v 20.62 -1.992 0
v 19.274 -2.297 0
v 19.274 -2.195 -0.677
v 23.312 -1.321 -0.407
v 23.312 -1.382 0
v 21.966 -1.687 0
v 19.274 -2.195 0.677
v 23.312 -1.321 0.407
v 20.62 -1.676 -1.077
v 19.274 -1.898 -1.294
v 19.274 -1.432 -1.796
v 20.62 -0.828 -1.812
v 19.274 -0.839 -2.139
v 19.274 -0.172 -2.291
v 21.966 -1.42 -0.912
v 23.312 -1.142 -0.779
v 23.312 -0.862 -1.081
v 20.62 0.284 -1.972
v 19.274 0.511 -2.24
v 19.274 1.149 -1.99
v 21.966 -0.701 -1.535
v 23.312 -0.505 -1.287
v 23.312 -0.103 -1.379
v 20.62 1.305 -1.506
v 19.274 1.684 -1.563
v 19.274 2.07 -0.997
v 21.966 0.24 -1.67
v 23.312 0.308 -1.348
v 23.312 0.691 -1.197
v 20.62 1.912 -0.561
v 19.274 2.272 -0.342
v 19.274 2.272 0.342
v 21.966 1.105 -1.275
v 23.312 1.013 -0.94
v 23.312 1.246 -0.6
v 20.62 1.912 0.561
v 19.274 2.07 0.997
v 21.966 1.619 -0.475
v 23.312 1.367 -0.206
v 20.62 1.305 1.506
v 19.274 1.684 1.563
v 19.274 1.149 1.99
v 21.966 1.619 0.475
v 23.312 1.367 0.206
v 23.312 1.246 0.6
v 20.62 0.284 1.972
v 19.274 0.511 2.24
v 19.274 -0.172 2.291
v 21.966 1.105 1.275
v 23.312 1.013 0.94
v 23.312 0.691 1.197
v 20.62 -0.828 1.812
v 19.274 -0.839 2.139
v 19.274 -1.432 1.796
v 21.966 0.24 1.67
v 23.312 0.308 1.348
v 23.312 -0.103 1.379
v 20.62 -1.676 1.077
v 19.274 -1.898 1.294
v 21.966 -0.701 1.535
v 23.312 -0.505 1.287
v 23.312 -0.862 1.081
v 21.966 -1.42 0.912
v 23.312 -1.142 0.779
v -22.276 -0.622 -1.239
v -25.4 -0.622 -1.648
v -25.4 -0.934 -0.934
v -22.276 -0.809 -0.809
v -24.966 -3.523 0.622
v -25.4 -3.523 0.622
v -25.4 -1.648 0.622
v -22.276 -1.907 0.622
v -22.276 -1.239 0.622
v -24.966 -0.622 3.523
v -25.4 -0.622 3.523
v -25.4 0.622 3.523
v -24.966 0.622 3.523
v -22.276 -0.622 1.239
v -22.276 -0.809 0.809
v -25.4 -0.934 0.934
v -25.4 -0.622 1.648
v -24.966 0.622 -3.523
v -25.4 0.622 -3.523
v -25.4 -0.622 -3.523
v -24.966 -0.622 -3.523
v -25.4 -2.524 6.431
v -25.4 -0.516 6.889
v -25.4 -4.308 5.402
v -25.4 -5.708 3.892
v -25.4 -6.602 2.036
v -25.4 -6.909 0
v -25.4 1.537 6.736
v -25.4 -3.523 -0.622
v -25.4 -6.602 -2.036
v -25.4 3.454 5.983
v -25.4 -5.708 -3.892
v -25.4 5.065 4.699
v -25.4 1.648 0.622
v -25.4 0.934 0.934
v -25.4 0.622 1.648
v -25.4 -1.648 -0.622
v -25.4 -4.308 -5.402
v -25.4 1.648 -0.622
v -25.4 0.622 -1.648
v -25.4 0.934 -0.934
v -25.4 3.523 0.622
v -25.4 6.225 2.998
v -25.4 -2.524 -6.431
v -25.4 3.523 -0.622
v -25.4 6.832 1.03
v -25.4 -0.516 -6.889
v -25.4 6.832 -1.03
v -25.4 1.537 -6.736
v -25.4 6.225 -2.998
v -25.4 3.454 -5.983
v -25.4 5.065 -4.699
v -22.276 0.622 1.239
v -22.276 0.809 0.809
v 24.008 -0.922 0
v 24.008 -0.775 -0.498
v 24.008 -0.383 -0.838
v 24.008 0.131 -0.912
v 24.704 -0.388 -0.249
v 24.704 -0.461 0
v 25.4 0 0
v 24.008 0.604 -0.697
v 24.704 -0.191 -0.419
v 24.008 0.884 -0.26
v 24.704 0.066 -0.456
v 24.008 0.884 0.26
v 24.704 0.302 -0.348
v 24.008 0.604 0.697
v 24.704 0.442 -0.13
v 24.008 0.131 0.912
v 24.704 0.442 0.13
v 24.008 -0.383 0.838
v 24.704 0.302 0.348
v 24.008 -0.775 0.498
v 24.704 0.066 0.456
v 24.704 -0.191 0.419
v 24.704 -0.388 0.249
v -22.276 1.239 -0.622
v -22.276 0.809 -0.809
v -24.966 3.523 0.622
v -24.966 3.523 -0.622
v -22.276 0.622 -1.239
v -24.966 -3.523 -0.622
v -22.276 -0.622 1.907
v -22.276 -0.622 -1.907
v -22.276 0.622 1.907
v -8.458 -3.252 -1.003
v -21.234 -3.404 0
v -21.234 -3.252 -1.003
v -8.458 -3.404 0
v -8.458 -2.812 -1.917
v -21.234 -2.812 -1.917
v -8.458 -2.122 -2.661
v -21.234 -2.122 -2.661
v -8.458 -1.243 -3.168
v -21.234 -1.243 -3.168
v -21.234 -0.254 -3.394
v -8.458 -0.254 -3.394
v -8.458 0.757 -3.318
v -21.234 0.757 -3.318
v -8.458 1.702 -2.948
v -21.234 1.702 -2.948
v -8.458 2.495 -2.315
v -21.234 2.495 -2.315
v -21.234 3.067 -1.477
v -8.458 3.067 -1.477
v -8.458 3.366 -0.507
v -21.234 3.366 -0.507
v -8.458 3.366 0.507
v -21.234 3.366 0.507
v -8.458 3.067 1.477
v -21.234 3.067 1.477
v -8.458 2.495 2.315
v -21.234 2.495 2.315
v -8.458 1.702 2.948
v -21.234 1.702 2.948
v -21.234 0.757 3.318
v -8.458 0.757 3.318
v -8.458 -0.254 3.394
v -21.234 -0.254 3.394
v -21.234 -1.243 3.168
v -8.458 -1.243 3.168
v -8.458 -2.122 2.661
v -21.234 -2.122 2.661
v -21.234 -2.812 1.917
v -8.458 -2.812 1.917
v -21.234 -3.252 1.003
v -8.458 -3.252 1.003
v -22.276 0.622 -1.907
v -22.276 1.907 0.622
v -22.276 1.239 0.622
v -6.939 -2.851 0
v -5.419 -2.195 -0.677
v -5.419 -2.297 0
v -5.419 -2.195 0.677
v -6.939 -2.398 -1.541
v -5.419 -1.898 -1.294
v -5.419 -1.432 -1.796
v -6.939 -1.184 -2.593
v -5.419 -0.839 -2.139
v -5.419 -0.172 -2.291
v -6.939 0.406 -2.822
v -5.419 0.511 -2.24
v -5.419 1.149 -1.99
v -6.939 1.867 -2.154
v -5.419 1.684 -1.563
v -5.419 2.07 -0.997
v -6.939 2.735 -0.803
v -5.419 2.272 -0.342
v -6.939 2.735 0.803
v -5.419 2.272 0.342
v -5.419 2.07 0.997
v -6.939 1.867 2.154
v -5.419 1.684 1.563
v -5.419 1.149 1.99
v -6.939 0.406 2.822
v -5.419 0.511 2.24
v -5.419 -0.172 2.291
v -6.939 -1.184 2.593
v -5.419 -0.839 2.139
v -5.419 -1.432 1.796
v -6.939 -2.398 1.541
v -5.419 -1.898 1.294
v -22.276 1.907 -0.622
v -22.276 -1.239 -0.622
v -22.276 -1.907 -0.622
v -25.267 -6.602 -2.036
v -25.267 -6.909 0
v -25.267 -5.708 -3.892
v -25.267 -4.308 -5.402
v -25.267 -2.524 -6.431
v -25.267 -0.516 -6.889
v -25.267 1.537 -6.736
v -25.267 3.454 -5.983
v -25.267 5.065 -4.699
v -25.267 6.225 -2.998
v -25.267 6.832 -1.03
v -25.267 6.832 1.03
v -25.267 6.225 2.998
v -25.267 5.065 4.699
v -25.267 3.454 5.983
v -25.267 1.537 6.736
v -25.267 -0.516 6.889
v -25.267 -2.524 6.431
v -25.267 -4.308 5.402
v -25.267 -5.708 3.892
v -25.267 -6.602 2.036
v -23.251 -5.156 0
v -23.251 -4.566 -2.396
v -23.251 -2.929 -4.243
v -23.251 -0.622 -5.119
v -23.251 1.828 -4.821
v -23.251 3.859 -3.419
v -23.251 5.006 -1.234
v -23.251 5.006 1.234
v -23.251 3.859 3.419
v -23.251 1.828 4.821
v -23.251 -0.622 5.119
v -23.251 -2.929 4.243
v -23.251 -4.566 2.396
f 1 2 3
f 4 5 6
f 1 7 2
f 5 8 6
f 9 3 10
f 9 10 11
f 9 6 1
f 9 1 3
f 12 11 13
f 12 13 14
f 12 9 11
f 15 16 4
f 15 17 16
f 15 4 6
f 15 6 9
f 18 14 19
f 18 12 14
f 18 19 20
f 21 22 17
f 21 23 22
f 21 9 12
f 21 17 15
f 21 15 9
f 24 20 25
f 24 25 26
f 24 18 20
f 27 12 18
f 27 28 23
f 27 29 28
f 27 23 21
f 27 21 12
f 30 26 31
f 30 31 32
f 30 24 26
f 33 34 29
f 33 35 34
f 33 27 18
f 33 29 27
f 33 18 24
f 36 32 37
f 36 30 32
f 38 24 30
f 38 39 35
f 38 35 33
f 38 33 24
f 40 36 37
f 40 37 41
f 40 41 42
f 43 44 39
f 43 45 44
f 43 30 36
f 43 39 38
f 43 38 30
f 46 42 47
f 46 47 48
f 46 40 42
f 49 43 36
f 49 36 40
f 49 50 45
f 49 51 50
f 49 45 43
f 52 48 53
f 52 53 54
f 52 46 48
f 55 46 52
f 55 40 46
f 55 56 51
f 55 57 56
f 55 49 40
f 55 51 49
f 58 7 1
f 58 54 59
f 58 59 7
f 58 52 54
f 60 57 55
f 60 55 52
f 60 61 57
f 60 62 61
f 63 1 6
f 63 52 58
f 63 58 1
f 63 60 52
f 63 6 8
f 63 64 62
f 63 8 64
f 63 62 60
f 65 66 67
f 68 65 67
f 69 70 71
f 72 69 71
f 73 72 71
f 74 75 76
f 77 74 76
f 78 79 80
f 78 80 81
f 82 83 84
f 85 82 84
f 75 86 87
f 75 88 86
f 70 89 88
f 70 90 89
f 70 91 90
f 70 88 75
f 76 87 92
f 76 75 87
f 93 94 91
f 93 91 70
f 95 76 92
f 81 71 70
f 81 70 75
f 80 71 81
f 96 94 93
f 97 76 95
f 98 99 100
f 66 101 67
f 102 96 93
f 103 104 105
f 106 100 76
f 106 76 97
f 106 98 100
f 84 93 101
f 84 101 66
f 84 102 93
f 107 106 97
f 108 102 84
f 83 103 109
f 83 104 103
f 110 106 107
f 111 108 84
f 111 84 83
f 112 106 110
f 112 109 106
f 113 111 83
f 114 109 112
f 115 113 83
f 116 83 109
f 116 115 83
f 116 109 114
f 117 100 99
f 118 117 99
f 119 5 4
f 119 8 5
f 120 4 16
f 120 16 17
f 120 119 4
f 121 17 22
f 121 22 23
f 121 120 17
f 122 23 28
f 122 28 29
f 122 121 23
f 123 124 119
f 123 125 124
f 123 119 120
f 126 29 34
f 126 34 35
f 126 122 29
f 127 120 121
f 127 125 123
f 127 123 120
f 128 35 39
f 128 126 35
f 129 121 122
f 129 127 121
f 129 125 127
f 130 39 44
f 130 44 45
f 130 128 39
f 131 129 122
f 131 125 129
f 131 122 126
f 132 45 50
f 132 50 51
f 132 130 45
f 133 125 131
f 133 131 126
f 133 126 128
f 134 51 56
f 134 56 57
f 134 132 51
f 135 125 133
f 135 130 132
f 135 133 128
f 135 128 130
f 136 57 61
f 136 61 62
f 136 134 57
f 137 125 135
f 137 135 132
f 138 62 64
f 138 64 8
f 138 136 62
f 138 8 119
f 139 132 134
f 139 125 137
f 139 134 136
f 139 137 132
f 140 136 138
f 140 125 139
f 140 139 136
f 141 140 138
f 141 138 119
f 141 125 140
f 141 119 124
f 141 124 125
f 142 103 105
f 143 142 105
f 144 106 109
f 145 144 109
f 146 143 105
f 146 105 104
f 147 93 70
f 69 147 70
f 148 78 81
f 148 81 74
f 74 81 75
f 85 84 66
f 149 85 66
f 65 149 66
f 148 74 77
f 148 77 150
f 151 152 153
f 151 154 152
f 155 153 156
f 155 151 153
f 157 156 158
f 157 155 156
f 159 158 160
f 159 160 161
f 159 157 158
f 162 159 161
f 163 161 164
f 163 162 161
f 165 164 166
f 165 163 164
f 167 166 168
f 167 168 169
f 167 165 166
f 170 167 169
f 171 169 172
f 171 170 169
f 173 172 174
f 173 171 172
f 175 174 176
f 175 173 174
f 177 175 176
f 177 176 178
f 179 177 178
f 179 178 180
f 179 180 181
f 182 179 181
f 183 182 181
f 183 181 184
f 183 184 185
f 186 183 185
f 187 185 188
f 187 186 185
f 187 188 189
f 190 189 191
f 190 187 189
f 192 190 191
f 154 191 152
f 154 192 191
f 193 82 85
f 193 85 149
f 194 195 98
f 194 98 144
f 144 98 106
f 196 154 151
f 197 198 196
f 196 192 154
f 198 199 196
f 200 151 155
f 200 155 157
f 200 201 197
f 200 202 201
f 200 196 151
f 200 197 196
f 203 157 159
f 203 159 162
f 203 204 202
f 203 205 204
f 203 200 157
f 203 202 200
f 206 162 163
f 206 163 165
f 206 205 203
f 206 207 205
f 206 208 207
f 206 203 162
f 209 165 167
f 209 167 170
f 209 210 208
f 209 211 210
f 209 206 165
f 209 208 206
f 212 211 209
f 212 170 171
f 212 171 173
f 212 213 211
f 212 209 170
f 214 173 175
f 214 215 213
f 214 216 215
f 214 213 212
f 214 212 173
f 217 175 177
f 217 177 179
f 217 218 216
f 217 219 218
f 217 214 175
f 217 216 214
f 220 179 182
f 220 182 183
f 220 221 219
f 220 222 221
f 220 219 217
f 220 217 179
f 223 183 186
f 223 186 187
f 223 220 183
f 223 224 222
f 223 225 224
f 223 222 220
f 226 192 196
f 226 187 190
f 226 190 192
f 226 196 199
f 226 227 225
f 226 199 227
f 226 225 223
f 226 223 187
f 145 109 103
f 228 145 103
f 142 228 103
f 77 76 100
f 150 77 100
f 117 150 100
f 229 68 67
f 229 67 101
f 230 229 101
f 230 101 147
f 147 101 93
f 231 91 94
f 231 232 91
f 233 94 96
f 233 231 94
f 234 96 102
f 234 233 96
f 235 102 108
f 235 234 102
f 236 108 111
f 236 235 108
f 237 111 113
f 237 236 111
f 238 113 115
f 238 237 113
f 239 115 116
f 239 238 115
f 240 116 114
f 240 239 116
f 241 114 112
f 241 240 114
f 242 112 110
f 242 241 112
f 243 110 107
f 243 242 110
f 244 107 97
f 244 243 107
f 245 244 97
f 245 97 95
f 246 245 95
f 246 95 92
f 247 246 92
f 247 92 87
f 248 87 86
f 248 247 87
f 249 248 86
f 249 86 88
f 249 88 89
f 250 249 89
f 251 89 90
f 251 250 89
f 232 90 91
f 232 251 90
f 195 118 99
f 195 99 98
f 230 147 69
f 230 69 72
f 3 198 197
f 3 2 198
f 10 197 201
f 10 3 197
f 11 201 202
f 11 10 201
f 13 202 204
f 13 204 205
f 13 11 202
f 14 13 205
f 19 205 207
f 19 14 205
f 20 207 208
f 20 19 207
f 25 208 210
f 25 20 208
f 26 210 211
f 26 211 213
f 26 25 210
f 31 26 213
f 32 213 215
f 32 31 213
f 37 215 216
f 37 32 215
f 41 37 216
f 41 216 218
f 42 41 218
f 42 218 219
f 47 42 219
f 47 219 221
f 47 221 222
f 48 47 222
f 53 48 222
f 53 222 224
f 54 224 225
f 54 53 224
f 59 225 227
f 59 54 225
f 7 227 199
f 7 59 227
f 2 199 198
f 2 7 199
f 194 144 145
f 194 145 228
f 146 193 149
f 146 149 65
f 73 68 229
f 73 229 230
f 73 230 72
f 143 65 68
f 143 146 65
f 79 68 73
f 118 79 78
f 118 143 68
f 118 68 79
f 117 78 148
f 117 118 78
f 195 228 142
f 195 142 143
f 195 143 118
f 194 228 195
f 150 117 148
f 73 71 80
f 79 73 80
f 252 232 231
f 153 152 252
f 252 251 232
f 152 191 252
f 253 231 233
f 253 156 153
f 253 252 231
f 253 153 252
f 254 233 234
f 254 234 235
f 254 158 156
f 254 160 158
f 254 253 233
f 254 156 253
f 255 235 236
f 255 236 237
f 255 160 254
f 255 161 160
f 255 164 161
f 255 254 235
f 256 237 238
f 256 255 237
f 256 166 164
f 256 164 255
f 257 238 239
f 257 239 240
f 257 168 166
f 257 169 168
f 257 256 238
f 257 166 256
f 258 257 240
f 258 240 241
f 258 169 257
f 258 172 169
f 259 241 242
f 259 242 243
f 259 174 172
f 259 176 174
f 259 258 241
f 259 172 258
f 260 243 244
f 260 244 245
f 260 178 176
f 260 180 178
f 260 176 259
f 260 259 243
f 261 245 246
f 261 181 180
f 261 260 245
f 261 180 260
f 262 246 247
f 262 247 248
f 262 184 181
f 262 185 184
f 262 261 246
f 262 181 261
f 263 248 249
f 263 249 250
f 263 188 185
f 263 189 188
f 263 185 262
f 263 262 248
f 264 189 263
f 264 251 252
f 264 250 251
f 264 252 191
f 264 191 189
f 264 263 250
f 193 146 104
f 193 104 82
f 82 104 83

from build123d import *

# Parameters (mm, degrees)
BOSS_EXTRUDE1_START = -25.4
BOSS_EXTRUDE1_DEPTH = 3.1242
CUT_EXTRUDE2_DEPTH  = 28.214390217
DRAFT2_ANGLE        = -3
CIRPATTERN3_COUNT   = 4


with BuildPart() as part:
    # Sketch13 → Revolve2 (revolve)
    with BuildSketch(Plane.XY, mode=Mode.PRIVATE) as revolve2_sk:
        Polygon((-25.4, 0), (-25.4, 6.9088), (-25.266671341, 6.9088), (-21.2344, 3.4036), (-8.4582, 3.4036), (-5.419022903, 2.29743), (19.27352, 2.29743), (23.312066741, 1.382457188), (25.4, 0), align=None)
    revolve(revolve2_sk.sketch.rotate(Axis((-25.4, 0, 0), (1, 0, 0)), 180), axis=Axis((-25.4, 0, 0), (1, 0, 0)))


with BuildPart() as body_2:
    # Sketch9 → Boss-Extrude1 (new body)
    with BuildSketch(Plane(origin=(0, 0, 0), x_dir=(0, 0, -1), z_dir=(1, 0, 0)).offset(BOSS_EXTRUDE1_START)):
        Polygon((0.621792, -1.648367869), (0.621792, -3.523488), (-0.621792, -3.523488), (-0.621792, -1.648367869), (-0.933766565, -0.933766565), (-1.648367869, -0.621792), (-3.523488, -0.621792), (-3.523488, 0.621792), (-1.648367869, 0.621792), (-0.933766565, 0.933766565), (-0.621792, 1.648367869), (-0.621792, 3.523488), (0.621792, 3.523488), (0.621792, 1.648367869), (0.933766565, 0.933766565), (1.648367869, 0.621792), (3.523488, 0.621792), (3.523488, -0.621792), (1.648367869, -0.621792), (0.933766565, -0.933766565), align=None)
    extrude(amount=BOSS_EXTRUDE1_DEPTH)

    # Sketch10 → Cut-Extrude2 (cut, symmetric)
    with BuildSketch(Plane.XY):
        Polygon((-24.96566, 3.523488), (-22.2758, 1.907257055), (-22.2758, 3.523488), align=None)
    cut_extrude2 = extrude(amount=CUT_EXTRUDE2_DEPTH, both=True, mode=Mode.SUBTRACT)

    # Draft2
    draft2_faces = [body_2.faces().sort_by_distance(p)[0] for p in [
        (-23.8379, 0.777779282, 1.291067217),
        (-23.8379, 1.291067217, 0.777779282),
        (-23.8379, 1.291067217, -0.777779282),
        (-23.8379, 0.777779282, -1.291067217),
        (-23.8379, -0.777779282, -1.291067217),
        (-23.8379, -1.291067217, -0.777779282),
        (-23.8379, -0.777779282, 1.291067217),
        (-23.8379, -1.291067217, 0.777779282),
    ]]
    draft(draft2_faces, Plane(origin=(-25.4, 0, 0), x_dir=(0, 0, -1), z_dir=(-1, 0, 0)), DRAFT2_ANGLE)

    # CirPattern3: Cut-Extrude2 ×4 about axis
    cirpattern3_axis = Axis((0, 0, 0), (1, 0, 0))
    for i in range(1, CIRPATTERN3_COUNT):
        add(cut_extrude2.rotate(cirpattern3_axis, i * 360 / CIRPATTERN3_COUNT), mode=Mode.SUBTRACT)


with BuildPart() as part_1:
    add(part.part)

    # Combine2: cut body 2
    add(body_2.part, mode=Mode.SUBTRACT)


solid = part_1.part
